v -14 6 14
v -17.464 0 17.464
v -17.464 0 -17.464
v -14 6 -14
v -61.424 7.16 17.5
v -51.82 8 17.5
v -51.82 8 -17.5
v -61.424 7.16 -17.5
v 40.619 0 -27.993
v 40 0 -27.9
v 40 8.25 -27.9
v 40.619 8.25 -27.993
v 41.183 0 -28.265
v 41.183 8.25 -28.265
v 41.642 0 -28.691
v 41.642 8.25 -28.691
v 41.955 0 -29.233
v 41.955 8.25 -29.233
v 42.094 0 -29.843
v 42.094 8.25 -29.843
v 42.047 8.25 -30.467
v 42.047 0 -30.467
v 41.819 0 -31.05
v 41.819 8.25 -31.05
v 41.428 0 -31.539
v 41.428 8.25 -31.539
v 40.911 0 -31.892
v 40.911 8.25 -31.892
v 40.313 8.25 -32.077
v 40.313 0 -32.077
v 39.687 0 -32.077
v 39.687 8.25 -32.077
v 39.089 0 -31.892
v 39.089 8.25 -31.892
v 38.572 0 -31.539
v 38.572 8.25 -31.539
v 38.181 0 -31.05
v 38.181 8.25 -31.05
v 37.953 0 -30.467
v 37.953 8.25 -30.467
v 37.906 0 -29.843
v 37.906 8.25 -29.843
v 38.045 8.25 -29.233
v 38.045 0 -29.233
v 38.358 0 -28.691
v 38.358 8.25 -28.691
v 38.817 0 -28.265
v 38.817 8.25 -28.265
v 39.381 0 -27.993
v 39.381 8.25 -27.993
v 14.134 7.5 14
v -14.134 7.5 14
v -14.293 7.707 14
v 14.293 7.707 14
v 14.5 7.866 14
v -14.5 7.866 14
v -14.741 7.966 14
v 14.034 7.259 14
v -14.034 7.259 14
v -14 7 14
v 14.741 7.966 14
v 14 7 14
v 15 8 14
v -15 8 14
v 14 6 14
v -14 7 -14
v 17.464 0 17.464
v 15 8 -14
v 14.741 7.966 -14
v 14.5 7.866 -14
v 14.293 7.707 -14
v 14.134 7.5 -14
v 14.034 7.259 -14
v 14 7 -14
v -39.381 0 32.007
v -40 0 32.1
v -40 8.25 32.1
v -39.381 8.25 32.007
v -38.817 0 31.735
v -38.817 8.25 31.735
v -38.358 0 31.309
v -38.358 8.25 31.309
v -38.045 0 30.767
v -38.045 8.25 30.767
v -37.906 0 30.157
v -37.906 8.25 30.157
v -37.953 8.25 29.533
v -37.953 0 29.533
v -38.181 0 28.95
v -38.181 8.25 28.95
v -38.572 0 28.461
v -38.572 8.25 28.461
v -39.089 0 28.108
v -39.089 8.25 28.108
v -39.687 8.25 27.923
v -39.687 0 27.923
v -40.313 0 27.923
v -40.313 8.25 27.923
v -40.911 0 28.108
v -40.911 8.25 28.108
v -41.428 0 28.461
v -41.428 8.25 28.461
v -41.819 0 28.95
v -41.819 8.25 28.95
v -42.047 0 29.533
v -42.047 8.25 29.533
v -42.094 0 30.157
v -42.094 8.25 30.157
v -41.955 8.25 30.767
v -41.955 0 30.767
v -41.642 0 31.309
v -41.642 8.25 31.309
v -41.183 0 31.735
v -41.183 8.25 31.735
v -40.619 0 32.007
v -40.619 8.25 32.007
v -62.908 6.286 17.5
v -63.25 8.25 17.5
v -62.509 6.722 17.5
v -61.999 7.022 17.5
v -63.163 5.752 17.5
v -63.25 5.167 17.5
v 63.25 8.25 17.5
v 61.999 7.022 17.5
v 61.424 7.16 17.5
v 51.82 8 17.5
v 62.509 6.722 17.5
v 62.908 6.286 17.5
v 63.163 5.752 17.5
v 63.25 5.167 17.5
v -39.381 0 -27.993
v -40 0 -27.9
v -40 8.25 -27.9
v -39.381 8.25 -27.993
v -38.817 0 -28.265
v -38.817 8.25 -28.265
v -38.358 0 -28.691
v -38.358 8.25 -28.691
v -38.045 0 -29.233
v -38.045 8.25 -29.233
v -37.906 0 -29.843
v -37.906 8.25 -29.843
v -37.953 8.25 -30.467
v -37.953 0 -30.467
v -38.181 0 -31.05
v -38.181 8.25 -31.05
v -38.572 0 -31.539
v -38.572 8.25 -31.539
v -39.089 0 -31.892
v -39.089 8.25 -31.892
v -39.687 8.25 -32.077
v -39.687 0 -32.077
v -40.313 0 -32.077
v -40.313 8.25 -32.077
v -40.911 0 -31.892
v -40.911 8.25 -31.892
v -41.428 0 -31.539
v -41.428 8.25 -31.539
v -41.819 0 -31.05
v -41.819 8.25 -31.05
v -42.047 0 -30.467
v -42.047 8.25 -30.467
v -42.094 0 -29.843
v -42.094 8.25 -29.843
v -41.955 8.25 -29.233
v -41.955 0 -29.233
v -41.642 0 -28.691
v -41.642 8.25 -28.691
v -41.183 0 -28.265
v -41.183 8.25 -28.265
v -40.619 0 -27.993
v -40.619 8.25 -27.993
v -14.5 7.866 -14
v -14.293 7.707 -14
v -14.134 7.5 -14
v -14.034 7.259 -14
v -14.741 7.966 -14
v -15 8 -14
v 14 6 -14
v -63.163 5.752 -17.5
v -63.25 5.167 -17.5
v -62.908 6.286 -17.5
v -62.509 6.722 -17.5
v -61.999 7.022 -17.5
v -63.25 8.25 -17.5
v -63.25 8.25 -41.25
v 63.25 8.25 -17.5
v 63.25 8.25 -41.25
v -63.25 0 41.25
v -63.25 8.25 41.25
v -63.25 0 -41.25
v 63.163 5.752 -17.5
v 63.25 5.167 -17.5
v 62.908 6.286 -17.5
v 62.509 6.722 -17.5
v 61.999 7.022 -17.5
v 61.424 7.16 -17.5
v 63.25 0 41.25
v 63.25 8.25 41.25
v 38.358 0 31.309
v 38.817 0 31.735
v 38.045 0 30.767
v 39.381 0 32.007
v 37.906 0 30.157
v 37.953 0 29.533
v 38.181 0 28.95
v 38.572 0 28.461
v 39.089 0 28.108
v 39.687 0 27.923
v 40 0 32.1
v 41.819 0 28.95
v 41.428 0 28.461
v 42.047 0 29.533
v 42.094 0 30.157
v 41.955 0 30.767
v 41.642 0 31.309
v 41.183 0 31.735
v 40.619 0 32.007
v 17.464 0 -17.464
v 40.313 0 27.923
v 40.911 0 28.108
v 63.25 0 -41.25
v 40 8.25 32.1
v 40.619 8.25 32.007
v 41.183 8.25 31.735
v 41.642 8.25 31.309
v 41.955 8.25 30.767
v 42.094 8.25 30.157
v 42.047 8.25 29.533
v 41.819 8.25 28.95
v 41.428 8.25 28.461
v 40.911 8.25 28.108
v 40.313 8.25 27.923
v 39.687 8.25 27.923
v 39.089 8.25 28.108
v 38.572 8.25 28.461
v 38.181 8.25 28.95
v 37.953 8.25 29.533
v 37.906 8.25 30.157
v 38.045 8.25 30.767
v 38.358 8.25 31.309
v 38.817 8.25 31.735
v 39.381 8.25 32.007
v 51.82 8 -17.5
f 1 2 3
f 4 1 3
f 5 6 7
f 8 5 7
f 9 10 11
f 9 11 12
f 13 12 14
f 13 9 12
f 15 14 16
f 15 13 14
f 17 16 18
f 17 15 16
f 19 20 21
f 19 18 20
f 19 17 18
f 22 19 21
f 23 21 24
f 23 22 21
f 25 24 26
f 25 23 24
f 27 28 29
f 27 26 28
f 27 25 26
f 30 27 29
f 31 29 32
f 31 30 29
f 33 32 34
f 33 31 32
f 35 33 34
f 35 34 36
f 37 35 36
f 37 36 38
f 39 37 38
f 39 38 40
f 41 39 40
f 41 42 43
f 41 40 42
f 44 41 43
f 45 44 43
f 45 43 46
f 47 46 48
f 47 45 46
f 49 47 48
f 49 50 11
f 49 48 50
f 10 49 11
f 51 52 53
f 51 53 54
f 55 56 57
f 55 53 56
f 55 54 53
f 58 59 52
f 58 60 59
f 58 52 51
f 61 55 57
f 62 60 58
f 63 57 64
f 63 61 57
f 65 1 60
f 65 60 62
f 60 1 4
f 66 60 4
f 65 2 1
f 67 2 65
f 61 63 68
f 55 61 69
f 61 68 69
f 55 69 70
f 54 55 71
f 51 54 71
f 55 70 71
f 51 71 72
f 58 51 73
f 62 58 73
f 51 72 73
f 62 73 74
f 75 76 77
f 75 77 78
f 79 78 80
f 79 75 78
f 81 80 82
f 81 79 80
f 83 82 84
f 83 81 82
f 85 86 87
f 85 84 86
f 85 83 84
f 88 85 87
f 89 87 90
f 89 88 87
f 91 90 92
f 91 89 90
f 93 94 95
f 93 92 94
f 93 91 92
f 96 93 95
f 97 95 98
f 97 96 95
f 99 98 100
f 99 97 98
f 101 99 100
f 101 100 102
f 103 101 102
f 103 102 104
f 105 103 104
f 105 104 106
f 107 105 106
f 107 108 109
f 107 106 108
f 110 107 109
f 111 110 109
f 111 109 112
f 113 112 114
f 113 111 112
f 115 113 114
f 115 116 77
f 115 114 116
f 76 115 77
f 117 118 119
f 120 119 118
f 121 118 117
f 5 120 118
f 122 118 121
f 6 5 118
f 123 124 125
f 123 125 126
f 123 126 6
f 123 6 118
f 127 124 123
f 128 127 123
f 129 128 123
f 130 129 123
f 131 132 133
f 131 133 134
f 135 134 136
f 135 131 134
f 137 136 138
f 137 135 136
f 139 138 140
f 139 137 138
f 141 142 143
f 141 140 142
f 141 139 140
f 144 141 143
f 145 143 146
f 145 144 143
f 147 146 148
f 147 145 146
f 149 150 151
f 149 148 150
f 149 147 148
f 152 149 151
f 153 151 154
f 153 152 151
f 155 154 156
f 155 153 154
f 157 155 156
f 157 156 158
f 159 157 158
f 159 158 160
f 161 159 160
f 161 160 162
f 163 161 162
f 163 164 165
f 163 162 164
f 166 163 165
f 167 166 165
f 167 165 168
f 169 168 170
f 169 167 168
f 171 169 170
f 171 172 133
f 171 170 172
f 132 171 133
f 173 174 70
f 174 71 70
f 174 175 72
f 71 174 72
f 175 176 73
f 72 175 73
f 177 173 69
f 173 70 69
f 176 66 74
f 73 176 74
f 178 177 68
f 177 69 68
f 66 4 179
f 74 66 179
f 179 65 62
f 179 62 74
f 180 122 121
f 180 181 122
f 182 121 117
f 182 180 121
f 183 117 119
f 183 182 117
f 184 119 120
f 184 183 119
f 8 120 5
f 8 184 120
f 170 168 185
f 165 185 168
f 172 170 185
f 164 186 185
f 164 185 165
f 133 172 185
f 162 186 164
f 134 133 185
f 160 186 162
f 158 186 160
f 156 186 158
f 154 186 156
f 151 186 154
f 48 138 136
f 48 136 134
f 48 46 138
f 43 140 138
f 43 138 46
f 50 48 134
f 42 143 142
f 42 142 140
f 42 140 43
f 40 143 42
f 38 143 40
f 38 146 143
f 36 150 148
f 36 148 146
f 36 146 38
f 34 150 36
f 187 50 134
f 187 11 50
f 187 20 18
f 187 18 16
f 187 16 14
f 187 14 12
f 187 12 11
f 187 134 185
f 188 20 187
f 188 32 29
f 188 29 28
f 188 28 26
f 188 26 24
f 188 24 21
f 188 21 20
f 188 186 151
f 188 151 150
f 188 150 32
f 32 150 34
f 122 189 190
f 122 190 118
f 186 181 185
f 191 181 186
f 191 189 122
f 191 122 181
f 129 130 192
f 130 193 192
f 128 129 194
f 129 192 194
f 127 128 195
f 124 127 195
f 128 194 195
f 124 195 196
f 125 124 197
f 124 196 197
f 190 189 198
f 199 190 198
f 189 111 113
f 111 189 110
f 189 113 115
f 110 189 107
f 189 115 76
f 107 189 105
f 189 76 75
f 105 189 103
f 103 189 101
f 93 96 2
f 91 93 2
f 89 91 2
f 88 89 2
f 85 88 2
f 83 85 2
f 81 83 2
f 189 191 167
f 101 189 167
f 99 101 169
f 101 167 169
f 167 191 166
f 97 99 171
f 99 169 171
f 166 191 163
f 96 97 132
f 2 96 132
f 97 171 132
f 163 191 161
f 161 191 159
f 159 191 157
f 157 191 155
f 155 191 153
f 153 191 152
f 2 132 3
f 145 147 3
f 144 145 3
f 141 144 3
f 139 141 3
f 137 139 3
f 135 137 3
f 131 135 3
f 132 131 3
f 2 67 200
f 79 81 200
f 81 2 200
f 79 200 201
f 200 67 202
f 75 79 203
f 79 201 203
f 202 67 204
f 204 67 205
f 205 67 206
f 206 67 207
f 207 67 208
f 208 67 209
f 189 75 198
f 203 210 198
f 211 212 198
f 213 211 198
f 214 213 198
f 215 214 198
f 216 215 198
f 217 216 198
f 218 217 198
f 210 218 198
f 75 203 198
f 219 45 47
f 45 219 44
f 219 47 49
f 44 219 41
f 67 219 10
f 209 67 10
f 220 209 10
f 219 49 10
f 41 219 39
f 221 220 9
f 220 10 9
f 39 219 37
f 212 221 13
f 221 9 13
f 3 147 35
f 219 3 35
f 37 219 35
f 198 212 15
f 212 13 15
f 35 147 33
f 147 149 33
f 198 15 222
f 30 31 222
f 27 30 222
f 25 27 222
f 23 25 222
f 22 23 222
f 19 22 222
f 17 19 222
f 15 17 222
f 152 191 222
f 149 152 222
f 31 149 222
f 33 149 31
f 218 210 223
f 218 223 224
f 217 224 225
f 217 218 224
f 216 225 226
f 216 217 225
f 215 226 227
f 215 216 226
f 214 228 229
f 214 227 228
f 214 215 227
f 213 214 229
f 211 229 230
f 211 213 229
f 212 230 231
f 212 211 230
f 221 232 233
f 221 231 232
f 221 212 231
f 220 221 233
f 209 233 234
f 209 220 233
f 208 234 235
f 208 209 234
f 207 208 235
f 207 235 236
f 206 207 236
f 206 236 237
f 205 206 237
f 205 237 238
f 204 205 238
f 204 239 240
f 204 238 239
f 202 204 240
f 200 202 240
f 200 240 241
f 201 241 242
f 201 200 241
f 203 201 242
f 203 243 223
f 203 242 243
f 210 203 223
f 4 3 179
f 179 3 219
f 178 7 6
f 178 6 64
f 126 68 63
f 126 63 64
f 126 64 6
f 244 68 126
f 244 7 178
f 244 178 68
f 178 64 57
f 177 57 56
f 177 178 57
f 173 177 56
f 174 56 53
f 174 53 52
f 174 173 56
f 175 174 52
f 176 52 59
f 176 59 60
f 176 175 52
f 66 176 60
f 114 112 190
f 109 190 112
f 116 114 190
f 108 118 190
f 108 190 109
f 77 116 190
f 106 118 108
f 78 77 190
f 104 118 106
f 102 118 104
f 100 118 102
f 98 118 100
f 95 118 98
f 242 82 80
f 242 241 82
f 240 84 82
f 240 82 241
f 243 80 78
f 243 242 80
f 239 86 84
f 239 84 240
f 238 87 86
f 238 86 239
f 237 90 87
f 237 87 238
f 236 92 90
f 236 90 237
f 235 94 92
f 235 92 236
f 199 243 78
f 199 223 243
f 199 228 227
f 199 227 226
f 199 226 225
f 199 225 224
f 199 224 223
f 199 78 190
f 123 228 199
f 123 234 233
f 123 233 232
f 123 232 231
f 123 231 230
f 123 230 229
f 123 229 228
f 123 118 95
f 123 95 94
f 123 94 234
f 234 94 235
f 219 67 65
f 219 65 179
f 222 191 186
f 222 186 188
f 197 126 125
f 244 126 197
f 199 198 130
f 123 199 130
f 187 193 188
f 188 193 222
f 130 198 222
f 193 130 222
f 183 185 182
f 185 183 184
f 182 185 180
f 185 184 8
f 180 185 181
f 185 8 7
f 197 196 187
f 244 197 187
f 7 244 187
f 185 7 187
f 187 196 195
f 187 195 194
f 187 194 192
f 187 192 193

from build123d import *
from OCP.BRepFilletAPI import BRepFilletAPI_MakeChamfer

# Parameters (mm, degrees)
SKETCH_1_W               = 126.5
SKETCH_1_H               = 82.5
SKETCH_1_W_2             = 28
SKETCH_1_H_2             = 28
EXTRUDE_1_DEPTH          = 8
SKETCH_2_W               = 126.5
SKETCH_2_H               = 23.75
EXTRUDE_2_DEPTH          = 0.25
CHAMFER_1_SIZE           = 1
CHAMFER_1_SIZE2          = 11.430052303
FILLET_1_R               = 2
FILLET_2_R               = 1
CUT_EXTRUDE_1_DEPTH      = 76.935005103
CUT_EXTRUDE_1_DEPTH_BACK = 76.935005103
SKETCH_3_R               = 2.1
CHAMFER_2_SIZE           = 6
CHAMFER_2_SIZE2          = 3.464101615
CHAMFER_3_SIZE           = 6
CHAMFER_3_SIZE2          = 3.464101615


with BuildPart() as part:
    # Эскиз1 → Бобышка-Вытянуть1 (new body)
    with BuildSketch(Plane(origin=(0, 0, 0), x_dir=(1, 0, 0), z_dir=(0, 1, 0))):
        Rectangle(SKETCH_1_W, SKETCH_1_H)
        Rectangle(SKETCH_1_W_2, SKETCH_1_H_2, mode=Mode.SUBTRACT)
    extrude(amount=EXTRUDE_1_DEPTH)

    # Эскиз2 → Бобышка-Вытянуть2 (add)
    with BuildSketch(Plane(origin=(0, 8, 0), x_dir=(1, 0, 0), z_dir=(0, 1, 0))):
        with Locations((0, 29.375)):
            Rectangle(SKETCH_2_W, SKETCH_2_H)
        with Locations((0, -29.375)):
            Rectangle(SKETCH_2_W, SKETCH_2_H)
    extrude(amount=EXTRUDE_2_DEPTH)

    # Фаска1: one chamfer whose edges measure the first distance from different faces: ONE call of the kernel's chamfer builder (chamfer() names one face for all edges)
    chamfer_1_edges_1 = [part.edges().sort_by_distance(p)[0] for p in [
        (-63.25, 8, 0),
    ]]
    chamfer_1_side_1 = [part.faces().sort_by_distance(p)[0] for p in [
        (-63.25, 4.072906977, 0),
    ]]
    chamfer_1_edges_2 = [part.edges().sort_by_distance(p)[0] for p in [
        (63.25, 8, 0),
    ]]
    chamfer_1_side_2 = [part.faces().sort_by_distance(p)[0] for p in [
        (63.25, 4.072906977, 0),
    ]]
    chamfer_1 = BRepFilletAPI_MakeChamfer(part.part.solid().wrapped)
    for e in chamfer_1_edges_1:
        chamfer_1.Add(CHAMFER_1_SIZE, CHAMFER_1_SIZE2, e.wrapped, chamfer_1_side_1[0].wrapped)  # the first distance lies on this face
    for e in chamfer_1_edges_2:
        chamfer_1.Add(CHAMFER_1_SIZE, CHAMFER_1_SIZE2, e.wrapped, chamfer_1_side_2[0].wrapped)  # the first distance lies on this face
    add(Compound.cast(chamfer_1.Shape()), mode=Mode.REPLACE)

    # Скругление1
    fillet_1_edges = [part.edges().sort_by_distance(p)[0] for p in [
        (63.25, 7, 0),
        (-63.25, 7, 0),
    ]]
    fillet(fillet_1_edges, radius=FILLET_1_R)

    # Скругление2
    fillet_2_edges = [part.edges().sort_by_distance(p)[0] for p in [
        (-14, 8, 0),
        (14, 8, 0),
    ]]
    fillet(fillet_2_edges, radius=FILLET_2_R)

    # Эскиз3 → Вырез-Вытянуть1 (cut, two sides: drawn at the far end of the back side and taken through both)
    with BuildSketch(Plane(origin=(0, 8, 0), x_dir=(1, 0, 0), z_dir=(0, 1, 0)).offset(-CUT_EXTRUDE_1_DEPTH_BACK)):
        with Locations(Location((-40, 30, 0), (0, 0, 270))):
            Circle(SKETCH_3_R)
        with Locations(Location((40, 30, 0), (0, 0, 270))):
            Circle(SKETCH_3_R)
        with Locations(Location((-40, -30, 0), (0, 0, 270))):
            Circle(SKETCH_3_R)
        with Locations(Location((40, -30, 0), (0, 0, 270))):
            Circle(SKETCH_3_R)
    extrude(amount=CUT_EXTRUDE_1_DEPTH + CUT_EXTRUDE_1_DEPTH_BACK, mode=Mode.SUBTRACT)

    # Фаска2: one chamfer whose edges measure the first distance from different faces: ONE call of the kernel's chamfer builder (chamfer() names one face for all edges)
    chamfer_2_edges_1 = [part.edges().sort_by_distance(p)[0] for p in [
        (-14, 0, 0),
    ]]
    chamfer_2_side_1 = [part.faces().sort_by_distance(p)[0] for p in [
        (-14, 3.5, 0),
    ]]
    chamfer_2_edges_2 = [part.edges().sort_by_distance(p)[0] for p in [
        (14, 0, 0),
    ]]
    chamfer_2_side_2 = [part.faces().sort_by_distance(p)[0] for p in [
        (14, 3.5, 0),
    ]]
    chamfer_2 = BRepFilletAPI_MakeChamfer(part.part.solid().wrapped)
    for e in chamfer_2_edges_1:
        chamfer_2.Add(CHAMFER_2_SIZE, CHAMFER_2_SIZE2, e.wrapped, chamfer_2_side_1[0].wrapped)  # the first distance lies on this face
    for e in chamfer_2_edges_2:
        chamfer_2.Add(CHAMFER_2_SIZE, CHAMFER_2_SIZE2, e.wrapped, chamfer_2_side_2[0].wrapped)  # the first distance lies on this face
    add(Compound.cast(chamfer_2.Shape()), mode=Mode.REPLACE)

    # Фаска3: one chamfer whose edges measure the first distance from different faces: ONE call of the kernel's chamfer builder (chamfer() names one face for all edges)
    chamfer_3_edges_1 = [part.edges().sort_by_distance(p)[0] for p in [
        (0, 0, 14),
    ]]
    chamfer_3_side_1 = [part.faces().sort_by_distance(p)[0] for p in [
        (0, 3.837087991, 14),
    ]]
    chamfer_3_edges_2 = [part.edges().sort_by_distance(p)[0] for p in [
        (0, 0, -14),
    ]]
    chamfer_3_side_2 = [part.faces().sort_by_distance(p)[0] for p in [
        (0, 3.837087991, -14),
    ]]
    chamfer_3 = BRepFilletAPI_MakeChamfer(part.part.solid().wrapped)
    for e in chamfer_3_edges_1:
        chamfer_3.Add(CHAMFER_3_SIZE, CHAMFER_3_SIZE2, e.wrapped, chamfer_3_side_1[0].wrapped)  # the first distance lies on this face
    for e in chamfer_3_edges_2:
        chamfer_3.Add(CHAMFER_3_SIZE, CHAMFER_3_SIZE2, e.wrapped, chamfer_3_side_2[0].wrapped)  # the first distance lies on this face
    add(Compound.cast(chamfer_3.Shape()), mode=Mode.REPLACE)


solid = part.part
